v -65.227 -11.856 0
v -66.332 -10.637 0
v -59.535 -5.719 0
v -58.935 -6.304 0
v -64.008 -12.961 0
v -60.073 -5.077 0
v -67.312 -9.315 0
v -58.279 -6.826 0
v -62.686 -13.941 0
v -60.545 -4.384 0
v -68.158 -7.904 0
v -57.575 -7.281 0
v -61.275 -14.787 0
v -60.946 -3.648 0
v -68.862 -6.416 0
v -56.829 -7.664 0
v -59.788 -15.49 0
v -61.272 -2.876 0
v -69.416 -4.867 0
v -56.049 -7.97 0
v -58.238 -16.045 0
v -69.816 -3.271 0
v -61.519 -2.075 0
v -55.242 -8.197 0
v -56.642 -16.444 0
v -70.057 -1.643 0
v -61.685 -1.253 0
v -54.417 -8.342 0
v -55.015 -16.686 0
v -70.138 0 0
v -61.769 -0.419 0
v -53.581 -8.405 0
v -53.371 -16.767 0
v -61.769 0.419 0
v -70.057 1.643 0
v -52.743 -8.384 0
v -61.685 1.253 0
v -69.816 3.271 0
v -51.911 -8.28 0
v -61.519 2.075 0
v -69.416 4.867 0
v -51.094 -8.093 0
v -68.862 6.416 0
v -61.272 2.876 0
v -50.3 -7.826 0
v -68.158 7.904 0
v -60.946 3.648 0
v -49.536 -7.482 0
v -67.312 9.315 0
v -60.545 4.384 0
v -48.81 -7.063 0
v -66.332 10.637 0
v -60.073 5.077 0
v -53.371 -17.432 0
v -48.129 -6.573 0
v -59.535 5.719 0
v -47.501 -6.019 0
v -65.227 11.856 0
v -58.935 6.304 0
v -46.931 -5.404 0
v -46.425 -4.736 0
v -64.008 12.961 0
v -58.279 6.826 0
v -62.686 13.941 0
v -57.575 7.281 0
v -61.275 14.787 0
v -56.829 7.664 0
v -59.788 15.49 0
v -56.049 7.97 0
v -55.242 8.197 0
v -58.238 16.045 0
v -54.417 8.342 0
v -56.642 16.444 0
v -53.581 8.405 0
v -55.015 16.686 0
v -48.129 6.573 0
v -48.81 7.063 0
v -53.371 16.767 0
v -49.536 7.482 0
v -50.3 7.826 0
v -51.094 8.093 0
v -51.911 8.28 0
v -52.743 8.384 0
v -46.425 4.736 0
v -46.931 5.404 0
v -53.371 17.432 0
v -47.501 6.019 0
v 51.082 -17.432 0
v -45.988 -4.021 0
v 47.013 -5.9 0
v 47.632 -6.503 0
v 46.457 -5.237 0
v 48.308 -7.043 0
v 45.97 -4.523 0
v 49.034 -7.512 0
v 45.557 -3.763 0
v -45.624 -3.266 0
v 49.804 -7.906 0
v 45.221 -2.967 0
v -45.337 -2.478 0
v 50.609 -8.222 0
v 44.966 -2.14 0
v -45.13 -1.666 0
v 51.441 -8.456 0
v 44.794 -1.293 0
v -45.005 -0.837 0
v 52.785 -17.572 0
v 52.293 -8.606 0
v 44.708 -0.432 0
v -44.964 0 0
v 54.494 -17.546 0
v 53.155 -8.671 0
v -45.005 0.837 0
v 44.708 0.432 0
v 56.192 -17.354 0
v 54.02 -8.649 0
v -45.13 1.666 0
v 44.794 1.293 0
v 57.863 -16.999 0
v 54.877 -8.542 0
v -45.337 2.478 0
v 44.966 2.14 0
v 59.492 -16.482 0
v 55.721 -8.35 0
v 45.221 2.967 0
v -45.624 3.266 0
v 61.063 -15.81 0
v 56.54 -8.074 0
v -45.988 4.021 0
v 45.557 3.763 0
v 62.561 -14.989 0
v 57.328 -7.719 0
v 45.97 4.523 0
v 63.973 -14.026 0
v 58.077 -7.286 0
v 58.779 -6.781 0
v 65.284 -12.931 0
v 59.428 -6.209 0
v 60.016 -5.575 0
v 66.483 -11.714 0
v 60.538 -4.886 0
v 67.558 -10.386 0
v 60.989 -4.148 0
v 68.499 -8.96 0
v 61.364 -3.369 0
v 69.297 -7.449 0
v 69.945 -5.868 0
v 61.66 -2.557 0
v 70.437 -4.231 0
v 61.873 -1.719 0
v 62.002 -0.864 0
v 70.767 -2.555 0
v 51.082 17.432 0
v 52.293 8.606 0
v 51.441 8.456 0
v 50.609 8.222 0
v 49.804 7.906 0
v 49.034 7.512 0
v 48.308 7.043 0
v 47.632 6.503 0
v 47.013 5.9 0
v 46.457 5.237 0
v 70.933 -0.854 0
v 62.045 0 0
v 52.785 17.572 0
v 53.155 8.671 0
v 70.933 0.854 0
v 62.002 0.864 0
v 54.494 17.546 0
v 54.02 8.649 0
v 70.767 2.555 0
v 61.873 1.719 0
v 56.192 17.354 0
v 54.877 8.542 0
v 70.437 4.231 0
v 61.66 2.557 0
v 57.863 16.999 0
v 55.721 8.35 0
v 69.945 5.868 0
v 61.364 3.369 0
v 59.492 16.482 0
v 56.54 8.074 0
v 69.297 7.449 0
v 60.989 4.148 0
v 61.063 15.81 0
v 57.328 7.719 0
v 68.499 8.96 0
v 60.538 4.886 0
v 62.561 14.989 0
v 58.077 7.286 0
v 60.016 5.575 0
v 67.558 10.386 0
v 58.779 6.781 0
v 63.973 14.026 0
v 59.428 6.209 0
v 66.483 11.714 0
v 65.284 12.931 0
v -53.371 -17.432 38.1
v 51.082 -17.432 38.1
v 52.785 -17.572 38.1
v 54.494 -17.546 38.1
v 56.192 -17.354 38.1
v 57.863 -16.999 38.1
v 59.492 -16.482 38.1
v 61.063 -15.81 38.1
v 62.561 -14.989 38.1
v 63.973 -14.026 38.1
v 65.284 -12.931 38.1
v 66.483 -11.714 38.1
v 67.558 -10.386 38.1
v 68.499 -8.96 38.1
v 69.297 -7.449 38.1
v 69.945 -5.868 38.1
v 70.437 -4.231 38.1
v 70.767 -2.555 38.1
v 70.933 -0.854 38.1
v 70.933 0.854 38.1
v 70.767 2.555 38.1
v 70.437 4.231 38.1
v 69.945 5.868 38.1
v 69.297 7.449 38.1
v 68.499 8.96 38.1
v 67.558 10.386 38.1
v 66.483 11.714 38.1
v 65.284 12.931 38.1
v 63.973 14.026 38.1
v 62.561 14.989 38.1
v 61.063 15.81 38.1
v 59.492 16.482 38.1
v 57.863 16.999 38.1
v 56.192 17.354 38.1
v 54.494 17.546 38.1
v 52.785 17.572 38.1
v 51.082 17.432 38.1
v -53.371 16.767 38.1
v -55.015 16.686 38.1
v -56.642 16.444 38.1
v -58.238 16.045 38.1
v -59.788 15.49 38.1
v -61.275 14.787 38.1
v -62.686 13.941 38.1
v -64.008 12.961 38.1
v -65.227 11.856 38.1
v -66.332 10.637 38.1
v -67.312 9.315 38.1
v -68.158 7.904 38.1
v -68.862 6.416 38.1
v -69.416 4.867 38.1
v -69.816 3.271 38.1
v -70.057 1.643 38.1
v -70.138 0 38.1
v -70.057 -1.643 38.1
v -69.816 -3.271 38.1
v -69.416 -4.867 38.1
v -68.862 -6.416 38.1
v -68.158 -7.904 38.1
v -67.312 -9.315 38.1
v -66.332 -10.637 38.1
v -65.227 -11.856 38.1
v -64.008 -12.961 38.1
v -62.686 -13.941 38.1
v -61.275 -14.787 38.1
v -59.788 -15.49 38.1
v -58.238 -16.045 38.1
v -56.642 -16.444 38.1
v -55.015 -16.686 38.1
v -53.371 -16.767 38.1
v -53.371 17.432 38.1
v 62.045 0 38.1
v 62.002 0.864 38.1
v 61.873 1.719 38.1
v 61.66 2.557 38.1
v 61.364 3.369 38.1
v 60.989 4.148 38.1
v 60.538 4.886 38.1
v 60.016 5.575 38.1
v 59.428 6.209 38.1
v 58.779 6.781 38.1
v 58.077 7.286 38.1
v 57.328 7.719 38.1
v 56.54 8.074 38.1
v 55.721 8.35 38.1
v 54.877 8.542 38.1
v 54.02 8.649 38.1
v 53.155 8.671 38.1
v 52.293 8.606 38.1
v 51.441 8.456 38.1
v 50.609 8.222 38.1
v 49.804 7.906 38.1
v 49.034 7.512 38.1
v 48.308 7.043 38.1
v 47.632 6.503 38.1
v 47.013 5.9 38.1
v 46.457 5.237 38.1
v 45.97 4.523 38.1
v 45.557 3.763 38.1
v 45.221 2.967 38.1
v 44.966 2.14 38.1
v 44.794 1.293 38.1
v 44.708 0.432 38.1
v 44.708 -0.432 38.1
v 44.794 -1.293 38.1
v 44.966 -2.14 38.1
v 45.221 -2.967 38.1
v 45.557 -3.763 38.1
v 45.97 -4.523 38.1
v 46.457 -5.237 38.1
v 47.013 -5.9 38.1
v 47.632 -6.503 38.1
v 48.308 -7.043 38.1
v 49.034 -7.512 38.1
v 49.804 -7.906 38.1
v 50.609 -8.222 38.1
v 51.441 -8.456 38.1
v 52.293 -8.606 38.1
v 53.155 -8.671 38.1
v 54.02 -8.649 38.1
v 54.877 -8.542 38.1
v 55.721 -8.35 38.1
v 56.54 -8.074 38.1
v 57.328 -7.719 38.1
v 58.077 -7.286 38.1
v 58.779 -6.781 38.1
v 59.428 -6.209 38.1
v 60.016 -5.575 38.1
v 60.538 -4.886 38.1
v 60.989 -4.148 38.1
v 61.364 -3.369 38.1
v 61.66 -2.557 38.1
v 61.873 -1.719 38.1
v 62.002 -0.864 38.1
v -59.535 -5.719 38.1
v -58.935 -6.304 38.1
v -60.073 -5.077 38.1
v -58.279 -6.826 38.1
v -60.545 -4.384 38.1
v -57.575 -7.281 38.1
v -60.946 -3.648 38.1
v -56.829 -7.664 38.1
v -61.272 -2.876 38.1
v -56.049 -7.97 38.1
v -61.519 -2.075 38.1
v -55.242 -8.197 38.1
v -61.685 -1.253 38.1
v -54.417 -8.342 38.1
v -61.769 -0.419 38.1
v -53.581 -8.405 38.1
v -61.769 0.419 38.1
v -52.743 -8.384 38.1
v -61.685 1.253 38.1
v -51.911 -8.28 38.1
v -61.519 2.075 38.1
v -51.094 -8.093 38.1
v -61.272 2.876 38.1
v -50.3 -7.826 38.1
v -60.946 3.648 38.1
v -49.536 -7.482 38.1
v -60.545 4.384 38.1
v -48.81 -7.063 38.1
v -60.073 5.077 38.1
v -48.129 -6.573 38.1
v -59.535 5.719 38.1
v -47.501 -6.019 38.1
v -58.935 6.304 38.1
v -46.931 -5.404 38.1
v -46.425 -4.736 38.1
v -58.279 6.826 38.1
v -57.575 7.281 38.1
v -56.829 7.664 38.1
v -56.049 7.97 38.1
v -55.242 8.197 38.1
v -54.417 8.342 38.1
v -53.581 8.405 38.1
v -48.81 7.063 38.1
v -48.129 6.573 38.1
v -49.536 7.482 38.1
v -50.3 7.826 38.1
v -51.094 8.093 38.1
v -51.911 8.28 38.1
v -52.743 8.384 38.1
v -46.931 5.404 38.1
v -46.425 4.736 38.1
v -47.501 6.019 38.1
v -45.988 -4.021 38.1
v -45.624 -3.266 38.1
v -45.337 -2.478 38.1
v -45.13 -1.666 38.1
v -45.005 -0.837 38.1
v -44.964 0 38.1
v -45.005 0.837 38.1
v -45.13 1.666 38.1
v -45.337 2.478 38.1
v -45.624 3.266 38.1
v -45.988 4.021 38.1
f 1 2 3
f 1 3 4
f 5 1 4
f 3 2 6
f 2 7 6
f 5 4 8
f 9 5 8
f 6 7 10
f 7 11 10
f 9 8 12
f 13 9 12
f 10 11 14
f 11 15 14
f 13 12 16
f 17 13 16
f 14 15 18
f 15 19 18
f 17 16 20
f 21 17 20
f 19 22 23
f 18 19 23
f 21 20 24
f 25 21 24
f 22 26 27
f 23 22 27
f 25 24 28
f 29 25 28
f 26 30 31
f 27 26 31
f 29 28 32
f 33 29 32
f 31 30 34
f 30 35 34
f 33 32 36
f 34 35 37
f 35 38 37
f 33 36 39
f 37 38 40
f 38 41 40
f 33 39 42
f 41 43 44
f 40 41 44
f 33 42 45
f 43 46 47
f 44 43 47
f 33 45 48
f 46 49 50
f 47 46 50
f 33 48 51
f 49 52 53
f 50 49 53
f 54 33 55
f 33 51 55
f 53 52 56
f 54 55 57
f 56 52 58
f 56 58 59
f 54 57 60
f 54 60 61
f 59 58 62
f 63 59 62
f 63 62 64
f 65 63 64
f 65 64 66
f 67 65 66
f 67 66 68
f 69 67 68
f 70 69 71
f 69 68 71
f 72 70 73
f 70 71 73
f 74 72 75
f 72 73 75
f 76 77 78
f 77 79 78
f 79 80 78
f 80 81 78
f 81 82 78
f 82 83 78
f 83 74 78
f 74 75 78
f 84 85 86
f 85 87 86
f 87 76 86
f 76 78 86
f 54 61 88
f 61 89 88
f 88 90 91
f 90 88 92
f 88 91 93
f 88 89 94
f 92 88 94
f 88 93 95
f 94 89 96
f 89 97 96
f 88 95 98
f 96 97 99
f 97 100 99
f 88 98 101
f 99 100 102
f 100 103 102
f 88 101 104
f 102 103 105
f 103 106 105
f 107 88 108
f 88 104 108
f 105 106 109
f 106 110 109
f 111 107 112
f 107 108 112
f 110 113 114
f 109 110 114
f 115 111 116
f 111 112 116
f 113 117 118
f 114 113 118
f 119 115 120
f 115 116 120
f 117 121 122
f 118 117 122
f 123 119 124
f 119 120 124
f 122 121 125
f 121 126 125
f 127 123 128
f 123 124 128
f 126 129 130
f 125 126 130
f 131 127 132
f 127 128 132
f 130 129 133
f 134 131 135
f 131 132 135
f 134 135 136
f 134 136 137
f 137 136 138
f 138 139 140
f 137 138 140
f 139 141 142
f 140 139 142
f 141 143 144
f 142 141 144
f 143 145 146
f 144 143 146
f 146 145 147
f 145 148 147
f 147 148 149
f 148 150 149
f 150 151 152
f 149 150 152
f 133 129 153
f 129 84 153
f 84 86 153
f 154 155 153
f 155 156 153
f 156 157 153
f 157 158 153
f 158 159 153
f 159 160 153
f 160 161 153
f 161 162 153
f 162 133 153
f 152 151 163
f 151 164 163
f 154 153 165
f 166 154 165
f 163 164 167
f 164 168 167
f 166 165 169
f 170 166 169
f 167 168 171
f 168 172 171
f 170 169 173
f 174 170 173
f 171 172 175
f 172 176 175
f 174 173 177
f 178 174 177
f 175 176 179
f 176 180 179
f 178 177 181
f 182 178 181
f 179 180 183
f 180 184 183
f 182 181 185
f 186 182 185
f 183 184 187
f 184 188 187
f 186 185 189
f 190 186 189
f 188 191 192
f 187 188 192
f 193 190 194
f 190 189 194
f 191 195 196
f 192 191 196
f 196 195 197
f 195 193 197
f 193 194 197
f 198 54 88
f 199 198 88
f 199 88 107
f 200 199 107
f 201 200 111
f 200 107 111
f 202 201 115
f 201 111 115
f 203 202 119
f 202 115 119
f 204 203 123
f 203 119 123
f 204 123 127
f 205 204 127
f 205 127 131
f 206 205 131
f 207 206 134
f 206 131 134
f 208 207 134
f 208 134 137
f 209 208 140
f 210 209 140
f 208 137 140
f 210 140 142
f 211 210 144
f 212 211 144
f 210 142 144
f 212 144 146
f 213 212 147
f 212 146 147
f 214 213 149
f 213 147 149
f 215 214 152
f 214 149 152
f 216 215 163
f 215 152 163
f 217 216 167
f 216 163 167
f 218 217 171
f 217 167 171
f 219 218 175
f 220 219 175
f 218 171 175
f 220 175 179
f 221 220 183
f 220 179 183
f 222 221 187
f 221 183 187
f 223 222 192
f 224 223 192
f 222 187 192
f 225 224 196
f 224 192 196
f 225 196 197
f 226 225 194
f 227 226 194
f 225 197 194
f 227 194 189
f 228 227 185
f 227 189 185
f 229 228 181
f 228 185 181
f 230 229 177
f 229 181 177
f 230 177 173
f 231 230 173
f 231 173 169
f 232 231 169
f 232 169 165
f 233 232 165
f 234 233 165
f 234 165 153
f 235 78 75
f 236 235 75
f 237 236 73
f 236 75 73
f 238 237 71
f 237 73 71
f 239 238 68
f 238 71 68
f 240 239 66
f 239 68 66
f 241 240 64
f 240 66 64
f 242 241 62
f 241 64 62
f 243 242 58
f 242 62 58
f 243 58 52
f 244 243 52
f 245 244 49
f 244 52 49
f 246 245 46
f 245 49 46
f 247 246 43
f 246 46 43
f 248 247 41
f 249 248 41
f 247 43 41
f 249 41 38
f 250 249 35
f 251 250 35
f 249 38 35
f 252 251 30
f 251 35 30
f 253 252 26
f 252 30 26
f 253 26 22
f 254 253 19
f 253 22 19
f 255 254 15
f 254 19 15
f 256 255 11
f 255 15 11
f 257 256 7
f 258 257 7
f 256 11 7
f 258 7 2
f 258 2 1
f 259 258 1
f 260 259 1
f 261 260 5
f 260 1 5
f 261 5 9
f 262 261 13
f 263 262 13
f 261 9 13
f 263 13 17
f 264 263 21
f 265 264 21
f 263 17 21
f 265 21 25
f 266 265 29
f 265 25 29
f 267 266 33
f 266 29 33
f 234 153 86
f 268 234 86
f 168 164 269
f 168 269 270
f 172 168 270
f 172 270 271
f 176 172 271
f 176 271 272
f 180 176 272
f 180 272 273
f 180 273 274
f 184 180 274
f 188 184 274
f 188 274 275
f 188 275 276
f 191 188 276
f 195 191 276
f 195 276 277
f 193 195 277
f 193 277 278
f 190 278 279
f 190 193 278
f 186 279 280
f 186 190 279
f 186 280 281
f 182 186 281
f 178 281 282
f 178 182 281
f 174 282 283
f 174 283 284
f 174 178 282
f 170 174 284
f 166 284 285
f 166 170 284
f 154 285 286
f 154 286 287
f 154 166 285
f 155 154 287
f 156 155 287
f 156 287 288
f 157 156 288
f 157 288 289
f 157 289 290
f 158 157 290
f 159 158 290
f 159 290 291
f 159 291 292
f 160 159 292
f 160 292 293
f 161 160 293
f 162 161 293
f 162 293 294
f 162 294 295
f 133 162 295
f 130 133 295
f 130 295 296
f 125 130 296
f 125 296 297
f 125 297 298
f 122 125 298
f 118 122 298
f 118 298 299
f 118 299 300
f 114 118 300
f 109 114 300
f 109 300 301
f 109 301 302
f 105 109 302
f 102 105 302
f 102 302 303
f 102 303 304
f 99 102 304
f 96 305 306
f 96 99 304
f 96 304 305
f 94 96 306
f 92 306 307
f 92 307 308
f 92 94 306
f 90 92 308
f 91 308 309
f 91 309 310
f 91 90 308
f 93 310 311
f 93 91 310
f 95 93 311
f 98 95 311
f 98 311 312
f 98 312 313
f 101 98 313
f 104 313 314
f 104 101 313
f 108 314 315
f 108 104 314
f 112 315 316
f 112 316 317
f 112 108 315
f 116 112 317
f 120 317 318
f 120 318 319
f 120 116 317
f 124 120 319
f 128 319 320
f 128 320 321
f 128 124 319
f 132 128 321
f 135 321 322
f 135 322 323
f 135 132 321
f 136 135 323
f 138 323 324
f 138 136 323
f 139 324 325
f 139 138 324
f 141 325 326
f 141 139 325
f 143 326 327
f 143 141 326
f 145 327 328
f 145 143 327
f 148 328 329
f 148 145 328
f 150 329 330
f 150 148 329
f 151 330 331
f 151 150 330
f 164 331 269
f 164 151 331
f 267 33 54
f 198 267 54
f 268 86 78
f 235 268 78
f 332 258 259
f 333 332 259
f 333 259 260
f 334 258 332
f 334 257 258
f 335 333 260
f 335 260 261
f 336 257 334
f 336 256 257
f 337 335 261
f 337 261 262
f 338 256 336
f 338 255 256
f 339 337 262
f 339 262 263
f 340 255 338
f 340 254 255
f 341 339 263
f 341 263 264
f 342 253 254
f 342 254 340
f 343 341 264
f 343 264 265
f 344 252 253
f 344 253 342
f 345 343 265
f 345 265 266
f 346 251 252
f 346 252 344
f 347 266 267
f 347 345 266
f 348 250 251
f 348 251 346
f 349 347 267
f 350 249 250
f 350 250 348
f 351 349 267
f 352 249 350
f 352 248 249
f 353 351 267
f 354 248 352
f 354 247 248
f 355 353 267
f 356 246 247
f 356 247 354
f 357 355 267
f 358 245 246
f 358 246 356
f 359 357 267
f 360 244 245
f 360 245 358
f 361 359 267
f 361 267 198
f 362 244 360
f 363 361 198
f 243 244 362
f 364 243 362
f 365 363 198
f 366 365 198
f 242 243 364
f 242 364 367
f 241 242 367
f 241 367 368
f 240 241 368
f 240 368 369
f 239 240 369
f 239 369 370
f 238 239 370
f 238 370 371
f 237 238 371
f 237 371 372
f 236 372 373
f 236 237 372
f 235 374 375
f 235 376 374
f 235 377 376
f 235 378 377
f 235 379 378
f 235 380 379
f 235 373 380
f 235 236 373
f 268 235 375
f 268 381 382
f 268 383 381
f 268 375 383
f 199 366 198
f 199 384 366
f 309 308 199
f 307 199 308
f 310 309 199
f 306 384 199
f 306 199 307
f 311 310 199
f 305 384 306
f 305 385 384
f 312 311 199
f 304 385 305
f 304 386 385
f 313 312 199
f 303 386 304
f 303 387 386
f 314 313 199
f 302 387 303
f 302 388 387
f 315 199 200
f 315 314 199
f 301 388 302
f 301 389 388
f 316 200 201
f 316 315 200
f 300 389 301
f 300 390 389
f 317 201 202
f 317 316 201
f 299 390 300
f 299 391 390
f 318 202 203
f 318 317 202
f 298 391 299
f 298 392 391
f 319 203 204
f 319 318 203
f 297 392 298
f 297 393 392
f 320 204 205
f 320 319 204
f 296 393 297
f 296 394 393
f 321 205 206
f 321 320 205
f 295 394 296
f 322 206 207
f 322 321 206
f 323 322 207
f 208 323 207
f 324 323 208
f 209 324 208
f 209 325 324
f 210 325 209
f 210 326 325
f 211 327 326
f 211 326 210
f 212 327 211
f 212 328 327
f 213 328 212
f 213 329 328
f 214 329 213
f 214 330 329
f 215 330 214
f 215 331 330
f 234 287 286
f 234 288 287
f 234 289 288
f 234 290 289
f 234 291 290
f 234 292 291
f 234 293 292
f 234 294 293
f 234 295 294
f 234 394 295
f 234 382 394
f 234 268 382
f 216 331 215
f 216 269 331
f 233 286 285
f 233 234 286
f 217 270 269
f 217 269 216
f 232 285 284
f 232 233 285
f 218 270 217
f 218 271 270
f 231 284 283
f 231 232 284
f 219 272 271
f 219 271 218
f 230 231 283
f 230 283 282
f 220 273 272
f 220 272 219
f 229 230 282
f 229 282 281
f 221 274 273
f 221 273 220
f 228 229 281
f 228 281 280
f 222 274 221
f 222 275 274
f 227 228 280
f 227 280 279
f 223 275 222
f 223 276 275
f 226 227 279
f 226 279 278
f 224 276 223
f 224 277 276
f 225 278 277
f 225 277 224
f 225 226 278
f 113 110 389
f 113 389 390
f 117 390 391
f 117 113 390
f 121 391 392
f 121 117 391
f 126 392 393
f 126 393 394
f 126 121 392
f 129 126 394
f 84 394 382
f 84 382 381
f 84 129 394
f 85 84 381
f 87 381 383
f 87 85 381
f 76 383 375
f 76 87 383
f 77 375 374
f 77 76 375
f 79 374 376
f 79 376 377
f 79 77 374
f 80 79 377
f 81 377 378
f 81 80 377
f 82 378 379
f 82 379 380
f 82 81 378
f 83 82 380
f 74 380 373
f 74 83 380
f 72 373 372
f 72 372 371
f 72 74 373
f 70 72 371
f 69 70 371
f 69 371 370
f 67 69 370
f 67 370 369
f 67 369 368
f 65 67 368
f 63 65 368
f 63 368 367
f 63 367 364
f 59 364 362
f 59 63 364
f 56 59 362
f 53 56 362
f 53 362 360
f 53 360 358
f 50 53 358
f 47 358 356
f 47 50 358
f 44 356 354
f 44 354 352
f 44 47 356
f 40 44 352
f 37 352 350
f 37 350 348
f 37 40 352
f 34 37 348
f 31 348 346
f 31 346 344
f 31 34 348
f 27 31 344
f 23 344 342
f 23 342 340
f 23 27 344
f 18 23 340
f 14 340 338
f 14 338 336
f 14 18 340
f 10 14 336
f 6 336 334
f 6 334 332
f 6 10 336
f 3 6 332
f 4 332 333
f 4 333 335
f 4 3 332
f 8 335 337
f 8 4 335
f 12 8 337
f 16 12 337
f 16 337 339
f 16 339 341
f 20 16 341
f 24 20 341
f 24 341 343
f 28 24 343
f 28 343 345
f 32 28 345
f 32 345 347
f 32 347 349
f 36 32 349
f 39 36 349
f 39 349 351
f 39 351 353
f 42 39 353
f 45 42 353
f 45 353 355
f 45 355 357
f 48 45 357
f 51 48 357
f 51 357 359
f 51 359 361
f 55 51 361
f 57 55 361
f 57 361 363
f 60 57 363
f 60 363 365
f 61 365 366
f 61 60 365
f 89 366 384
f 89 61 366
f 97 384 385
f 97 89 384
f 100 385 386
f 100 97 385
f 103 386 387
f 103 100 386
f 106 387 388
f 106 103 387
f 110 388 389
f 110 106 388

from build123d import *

# Parameters (mm, degrees)
F0_R     = 8.6737376807
F1_DEPTH = 25.4
F0_R_2   = 8.4076501903
F2_DEPTH = 38.1


# Not quite as in the source:
# - a feature names something its author has since deleted; it is built from what else it names


with BuildPart() as f1:
    # F0 (on Top) → F1 (new body)
    with BuildSketch(Plane.XY):
        with BuildLine():
            ThreePointArc((51.0823471633, -17.43234694), (70.9533001066, 0), (51.0823471633, 17.43234694))
            Line((51.0823471633, 17.43234694), (-53.3713176847, 17.43234694))
            Line((-53.3713176847, 17.43234694), (-53.3713176847, 16.7665737877))
            ThreePointArc((-53.3713176847, 16.7665737877), (-41.5155596621, 11.8557580225), (-36.604743897, 0))
            ThreePointArc((-36.604743897, 0), (-41.5155596621, -11.8557580225), (-53.3713176847, -16.7665737877))
            Line((-53.3713176847, -16.7665737877), (-53.3713176847, -17.43234694))
            Line((-53.3713176847, -17.43234694), (51.0823471633, -17.43234694))
        make_face()
        with Locations((53.3713176847, 0)):
            Circle(F0_R, mode=Mode.SUBTRACT)
    extrude(amount=F1_DEPTH)

    # F0 (on Top) → F2 (join)
    with BuildSketch(Plane.XY):
        with BuildLine():
            ThreePointArc((51.0823471633, -17.43234694), (70.9533001066, 0), (51.0823471633, 17.43234694))
            Line((51.0823471633, 17.43234694), (-53.3713176847, 17.43234694))
            Line((-53.3713176847, 17.43234694), (-53.3713176847, 16.7665737877))
            ThreePointArc((-53.3713176847, 16.7665737877), (-41.5155596621, 11.8557580225), (-36.604743897, 0))
            ThreePointArc((-36.604743897, 0), (-41.5155596621, -11.8557580225), (-53.3713176847, -16.7665737877))
            Line((-53.3713176847, -16.7665737877), (-53.3713176847, -17.43234694))
            Line((-53.3713176847, -17.43234694), (51.0823471633, -17.43234694))
        make_face()
        with Locations((53.3713176847, 0)):
            Circle(F0_R, mode=Mode.SUBTRACT)
        with BuildLine():
            ThreePointArc((-36.604743897, 0), (-41.5155596621, 11.8557580225), (-53.3713176847, 16.7665737877))
            ThreePointArc((-53.3713176847, 16.7665737877), (-70.1378914723, 0), (-53.3713176847, -16.7665737877))
            ThreePointArc((-53.3713176847, -16.7665737877), (-41.5155596621, -11.8557580225), (-36.604743897, 0))
        make_face()
        with Locations((-53.3713176847, 0)):
            Circle(F0_R_2, mode=Mode.SUBTRACT)
    extrude(amount=F2_DEPTH)


solid = f1.part
